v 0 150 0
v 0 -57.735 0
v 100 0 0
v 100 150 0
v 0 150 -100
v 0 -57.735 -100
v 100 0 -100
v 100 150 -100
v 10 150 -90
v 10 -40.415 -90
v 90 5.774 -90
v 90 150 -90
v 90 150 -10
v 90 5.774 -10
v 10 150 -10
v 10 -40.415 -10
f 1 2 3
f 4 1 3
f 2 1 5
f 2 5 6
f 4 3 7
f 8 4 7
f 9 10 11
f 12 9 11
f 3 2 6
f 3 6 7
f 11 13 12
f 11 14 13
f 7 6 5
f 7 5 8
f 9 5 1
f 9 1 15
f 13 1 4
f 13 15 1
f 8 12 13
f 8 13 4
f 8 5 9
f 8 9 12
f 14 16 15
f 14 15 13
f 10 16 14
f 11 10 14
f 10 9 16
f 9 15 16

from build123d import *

# Parameters (mm, degrees)
CROQUIS1_W              = 100
CROQUIS1_H              = 100
SALIENTE_EXTRUIR1_DEPTH = 150
SALIENTE_EXTRUIR2_DEPTH = 100
VACIADO4_T              = -10


with BuildPart() as part:
    # Croquis1 → Saliente-Extruir1 (new body)
    with BuildSketch(Plane(origin=(0, 0, 0), x_dir=(1, 0, 0), z_dir=(0, 1, 0))):
        with Locations((50, 50)):
            Rectangle(CROQUIS1_W, CROQUIS1_H)
    extrude(amount=SALIENTE_EXTRUIR1_DEPTH)

    # Croquis2 → Saliente-Extruir2 (add)
    with BuildSketch(Plane.XY):
        Polygon((0, 0), (0, -57.735026919), (100, 0), align=None)
    extrude(amount=-SALIENTE_EXTRUIR2_DEPTH)

    # Vaciado4
    vaciado4_openings = [part.faces().sort_by_distance(p)[0] for p in [
        (50, 150, -50),
    ]]
    offset(amount=VACIADO4_T, openings=vaciado4_openings, kind=Kind.INTERSECTION)


solid = part.part
